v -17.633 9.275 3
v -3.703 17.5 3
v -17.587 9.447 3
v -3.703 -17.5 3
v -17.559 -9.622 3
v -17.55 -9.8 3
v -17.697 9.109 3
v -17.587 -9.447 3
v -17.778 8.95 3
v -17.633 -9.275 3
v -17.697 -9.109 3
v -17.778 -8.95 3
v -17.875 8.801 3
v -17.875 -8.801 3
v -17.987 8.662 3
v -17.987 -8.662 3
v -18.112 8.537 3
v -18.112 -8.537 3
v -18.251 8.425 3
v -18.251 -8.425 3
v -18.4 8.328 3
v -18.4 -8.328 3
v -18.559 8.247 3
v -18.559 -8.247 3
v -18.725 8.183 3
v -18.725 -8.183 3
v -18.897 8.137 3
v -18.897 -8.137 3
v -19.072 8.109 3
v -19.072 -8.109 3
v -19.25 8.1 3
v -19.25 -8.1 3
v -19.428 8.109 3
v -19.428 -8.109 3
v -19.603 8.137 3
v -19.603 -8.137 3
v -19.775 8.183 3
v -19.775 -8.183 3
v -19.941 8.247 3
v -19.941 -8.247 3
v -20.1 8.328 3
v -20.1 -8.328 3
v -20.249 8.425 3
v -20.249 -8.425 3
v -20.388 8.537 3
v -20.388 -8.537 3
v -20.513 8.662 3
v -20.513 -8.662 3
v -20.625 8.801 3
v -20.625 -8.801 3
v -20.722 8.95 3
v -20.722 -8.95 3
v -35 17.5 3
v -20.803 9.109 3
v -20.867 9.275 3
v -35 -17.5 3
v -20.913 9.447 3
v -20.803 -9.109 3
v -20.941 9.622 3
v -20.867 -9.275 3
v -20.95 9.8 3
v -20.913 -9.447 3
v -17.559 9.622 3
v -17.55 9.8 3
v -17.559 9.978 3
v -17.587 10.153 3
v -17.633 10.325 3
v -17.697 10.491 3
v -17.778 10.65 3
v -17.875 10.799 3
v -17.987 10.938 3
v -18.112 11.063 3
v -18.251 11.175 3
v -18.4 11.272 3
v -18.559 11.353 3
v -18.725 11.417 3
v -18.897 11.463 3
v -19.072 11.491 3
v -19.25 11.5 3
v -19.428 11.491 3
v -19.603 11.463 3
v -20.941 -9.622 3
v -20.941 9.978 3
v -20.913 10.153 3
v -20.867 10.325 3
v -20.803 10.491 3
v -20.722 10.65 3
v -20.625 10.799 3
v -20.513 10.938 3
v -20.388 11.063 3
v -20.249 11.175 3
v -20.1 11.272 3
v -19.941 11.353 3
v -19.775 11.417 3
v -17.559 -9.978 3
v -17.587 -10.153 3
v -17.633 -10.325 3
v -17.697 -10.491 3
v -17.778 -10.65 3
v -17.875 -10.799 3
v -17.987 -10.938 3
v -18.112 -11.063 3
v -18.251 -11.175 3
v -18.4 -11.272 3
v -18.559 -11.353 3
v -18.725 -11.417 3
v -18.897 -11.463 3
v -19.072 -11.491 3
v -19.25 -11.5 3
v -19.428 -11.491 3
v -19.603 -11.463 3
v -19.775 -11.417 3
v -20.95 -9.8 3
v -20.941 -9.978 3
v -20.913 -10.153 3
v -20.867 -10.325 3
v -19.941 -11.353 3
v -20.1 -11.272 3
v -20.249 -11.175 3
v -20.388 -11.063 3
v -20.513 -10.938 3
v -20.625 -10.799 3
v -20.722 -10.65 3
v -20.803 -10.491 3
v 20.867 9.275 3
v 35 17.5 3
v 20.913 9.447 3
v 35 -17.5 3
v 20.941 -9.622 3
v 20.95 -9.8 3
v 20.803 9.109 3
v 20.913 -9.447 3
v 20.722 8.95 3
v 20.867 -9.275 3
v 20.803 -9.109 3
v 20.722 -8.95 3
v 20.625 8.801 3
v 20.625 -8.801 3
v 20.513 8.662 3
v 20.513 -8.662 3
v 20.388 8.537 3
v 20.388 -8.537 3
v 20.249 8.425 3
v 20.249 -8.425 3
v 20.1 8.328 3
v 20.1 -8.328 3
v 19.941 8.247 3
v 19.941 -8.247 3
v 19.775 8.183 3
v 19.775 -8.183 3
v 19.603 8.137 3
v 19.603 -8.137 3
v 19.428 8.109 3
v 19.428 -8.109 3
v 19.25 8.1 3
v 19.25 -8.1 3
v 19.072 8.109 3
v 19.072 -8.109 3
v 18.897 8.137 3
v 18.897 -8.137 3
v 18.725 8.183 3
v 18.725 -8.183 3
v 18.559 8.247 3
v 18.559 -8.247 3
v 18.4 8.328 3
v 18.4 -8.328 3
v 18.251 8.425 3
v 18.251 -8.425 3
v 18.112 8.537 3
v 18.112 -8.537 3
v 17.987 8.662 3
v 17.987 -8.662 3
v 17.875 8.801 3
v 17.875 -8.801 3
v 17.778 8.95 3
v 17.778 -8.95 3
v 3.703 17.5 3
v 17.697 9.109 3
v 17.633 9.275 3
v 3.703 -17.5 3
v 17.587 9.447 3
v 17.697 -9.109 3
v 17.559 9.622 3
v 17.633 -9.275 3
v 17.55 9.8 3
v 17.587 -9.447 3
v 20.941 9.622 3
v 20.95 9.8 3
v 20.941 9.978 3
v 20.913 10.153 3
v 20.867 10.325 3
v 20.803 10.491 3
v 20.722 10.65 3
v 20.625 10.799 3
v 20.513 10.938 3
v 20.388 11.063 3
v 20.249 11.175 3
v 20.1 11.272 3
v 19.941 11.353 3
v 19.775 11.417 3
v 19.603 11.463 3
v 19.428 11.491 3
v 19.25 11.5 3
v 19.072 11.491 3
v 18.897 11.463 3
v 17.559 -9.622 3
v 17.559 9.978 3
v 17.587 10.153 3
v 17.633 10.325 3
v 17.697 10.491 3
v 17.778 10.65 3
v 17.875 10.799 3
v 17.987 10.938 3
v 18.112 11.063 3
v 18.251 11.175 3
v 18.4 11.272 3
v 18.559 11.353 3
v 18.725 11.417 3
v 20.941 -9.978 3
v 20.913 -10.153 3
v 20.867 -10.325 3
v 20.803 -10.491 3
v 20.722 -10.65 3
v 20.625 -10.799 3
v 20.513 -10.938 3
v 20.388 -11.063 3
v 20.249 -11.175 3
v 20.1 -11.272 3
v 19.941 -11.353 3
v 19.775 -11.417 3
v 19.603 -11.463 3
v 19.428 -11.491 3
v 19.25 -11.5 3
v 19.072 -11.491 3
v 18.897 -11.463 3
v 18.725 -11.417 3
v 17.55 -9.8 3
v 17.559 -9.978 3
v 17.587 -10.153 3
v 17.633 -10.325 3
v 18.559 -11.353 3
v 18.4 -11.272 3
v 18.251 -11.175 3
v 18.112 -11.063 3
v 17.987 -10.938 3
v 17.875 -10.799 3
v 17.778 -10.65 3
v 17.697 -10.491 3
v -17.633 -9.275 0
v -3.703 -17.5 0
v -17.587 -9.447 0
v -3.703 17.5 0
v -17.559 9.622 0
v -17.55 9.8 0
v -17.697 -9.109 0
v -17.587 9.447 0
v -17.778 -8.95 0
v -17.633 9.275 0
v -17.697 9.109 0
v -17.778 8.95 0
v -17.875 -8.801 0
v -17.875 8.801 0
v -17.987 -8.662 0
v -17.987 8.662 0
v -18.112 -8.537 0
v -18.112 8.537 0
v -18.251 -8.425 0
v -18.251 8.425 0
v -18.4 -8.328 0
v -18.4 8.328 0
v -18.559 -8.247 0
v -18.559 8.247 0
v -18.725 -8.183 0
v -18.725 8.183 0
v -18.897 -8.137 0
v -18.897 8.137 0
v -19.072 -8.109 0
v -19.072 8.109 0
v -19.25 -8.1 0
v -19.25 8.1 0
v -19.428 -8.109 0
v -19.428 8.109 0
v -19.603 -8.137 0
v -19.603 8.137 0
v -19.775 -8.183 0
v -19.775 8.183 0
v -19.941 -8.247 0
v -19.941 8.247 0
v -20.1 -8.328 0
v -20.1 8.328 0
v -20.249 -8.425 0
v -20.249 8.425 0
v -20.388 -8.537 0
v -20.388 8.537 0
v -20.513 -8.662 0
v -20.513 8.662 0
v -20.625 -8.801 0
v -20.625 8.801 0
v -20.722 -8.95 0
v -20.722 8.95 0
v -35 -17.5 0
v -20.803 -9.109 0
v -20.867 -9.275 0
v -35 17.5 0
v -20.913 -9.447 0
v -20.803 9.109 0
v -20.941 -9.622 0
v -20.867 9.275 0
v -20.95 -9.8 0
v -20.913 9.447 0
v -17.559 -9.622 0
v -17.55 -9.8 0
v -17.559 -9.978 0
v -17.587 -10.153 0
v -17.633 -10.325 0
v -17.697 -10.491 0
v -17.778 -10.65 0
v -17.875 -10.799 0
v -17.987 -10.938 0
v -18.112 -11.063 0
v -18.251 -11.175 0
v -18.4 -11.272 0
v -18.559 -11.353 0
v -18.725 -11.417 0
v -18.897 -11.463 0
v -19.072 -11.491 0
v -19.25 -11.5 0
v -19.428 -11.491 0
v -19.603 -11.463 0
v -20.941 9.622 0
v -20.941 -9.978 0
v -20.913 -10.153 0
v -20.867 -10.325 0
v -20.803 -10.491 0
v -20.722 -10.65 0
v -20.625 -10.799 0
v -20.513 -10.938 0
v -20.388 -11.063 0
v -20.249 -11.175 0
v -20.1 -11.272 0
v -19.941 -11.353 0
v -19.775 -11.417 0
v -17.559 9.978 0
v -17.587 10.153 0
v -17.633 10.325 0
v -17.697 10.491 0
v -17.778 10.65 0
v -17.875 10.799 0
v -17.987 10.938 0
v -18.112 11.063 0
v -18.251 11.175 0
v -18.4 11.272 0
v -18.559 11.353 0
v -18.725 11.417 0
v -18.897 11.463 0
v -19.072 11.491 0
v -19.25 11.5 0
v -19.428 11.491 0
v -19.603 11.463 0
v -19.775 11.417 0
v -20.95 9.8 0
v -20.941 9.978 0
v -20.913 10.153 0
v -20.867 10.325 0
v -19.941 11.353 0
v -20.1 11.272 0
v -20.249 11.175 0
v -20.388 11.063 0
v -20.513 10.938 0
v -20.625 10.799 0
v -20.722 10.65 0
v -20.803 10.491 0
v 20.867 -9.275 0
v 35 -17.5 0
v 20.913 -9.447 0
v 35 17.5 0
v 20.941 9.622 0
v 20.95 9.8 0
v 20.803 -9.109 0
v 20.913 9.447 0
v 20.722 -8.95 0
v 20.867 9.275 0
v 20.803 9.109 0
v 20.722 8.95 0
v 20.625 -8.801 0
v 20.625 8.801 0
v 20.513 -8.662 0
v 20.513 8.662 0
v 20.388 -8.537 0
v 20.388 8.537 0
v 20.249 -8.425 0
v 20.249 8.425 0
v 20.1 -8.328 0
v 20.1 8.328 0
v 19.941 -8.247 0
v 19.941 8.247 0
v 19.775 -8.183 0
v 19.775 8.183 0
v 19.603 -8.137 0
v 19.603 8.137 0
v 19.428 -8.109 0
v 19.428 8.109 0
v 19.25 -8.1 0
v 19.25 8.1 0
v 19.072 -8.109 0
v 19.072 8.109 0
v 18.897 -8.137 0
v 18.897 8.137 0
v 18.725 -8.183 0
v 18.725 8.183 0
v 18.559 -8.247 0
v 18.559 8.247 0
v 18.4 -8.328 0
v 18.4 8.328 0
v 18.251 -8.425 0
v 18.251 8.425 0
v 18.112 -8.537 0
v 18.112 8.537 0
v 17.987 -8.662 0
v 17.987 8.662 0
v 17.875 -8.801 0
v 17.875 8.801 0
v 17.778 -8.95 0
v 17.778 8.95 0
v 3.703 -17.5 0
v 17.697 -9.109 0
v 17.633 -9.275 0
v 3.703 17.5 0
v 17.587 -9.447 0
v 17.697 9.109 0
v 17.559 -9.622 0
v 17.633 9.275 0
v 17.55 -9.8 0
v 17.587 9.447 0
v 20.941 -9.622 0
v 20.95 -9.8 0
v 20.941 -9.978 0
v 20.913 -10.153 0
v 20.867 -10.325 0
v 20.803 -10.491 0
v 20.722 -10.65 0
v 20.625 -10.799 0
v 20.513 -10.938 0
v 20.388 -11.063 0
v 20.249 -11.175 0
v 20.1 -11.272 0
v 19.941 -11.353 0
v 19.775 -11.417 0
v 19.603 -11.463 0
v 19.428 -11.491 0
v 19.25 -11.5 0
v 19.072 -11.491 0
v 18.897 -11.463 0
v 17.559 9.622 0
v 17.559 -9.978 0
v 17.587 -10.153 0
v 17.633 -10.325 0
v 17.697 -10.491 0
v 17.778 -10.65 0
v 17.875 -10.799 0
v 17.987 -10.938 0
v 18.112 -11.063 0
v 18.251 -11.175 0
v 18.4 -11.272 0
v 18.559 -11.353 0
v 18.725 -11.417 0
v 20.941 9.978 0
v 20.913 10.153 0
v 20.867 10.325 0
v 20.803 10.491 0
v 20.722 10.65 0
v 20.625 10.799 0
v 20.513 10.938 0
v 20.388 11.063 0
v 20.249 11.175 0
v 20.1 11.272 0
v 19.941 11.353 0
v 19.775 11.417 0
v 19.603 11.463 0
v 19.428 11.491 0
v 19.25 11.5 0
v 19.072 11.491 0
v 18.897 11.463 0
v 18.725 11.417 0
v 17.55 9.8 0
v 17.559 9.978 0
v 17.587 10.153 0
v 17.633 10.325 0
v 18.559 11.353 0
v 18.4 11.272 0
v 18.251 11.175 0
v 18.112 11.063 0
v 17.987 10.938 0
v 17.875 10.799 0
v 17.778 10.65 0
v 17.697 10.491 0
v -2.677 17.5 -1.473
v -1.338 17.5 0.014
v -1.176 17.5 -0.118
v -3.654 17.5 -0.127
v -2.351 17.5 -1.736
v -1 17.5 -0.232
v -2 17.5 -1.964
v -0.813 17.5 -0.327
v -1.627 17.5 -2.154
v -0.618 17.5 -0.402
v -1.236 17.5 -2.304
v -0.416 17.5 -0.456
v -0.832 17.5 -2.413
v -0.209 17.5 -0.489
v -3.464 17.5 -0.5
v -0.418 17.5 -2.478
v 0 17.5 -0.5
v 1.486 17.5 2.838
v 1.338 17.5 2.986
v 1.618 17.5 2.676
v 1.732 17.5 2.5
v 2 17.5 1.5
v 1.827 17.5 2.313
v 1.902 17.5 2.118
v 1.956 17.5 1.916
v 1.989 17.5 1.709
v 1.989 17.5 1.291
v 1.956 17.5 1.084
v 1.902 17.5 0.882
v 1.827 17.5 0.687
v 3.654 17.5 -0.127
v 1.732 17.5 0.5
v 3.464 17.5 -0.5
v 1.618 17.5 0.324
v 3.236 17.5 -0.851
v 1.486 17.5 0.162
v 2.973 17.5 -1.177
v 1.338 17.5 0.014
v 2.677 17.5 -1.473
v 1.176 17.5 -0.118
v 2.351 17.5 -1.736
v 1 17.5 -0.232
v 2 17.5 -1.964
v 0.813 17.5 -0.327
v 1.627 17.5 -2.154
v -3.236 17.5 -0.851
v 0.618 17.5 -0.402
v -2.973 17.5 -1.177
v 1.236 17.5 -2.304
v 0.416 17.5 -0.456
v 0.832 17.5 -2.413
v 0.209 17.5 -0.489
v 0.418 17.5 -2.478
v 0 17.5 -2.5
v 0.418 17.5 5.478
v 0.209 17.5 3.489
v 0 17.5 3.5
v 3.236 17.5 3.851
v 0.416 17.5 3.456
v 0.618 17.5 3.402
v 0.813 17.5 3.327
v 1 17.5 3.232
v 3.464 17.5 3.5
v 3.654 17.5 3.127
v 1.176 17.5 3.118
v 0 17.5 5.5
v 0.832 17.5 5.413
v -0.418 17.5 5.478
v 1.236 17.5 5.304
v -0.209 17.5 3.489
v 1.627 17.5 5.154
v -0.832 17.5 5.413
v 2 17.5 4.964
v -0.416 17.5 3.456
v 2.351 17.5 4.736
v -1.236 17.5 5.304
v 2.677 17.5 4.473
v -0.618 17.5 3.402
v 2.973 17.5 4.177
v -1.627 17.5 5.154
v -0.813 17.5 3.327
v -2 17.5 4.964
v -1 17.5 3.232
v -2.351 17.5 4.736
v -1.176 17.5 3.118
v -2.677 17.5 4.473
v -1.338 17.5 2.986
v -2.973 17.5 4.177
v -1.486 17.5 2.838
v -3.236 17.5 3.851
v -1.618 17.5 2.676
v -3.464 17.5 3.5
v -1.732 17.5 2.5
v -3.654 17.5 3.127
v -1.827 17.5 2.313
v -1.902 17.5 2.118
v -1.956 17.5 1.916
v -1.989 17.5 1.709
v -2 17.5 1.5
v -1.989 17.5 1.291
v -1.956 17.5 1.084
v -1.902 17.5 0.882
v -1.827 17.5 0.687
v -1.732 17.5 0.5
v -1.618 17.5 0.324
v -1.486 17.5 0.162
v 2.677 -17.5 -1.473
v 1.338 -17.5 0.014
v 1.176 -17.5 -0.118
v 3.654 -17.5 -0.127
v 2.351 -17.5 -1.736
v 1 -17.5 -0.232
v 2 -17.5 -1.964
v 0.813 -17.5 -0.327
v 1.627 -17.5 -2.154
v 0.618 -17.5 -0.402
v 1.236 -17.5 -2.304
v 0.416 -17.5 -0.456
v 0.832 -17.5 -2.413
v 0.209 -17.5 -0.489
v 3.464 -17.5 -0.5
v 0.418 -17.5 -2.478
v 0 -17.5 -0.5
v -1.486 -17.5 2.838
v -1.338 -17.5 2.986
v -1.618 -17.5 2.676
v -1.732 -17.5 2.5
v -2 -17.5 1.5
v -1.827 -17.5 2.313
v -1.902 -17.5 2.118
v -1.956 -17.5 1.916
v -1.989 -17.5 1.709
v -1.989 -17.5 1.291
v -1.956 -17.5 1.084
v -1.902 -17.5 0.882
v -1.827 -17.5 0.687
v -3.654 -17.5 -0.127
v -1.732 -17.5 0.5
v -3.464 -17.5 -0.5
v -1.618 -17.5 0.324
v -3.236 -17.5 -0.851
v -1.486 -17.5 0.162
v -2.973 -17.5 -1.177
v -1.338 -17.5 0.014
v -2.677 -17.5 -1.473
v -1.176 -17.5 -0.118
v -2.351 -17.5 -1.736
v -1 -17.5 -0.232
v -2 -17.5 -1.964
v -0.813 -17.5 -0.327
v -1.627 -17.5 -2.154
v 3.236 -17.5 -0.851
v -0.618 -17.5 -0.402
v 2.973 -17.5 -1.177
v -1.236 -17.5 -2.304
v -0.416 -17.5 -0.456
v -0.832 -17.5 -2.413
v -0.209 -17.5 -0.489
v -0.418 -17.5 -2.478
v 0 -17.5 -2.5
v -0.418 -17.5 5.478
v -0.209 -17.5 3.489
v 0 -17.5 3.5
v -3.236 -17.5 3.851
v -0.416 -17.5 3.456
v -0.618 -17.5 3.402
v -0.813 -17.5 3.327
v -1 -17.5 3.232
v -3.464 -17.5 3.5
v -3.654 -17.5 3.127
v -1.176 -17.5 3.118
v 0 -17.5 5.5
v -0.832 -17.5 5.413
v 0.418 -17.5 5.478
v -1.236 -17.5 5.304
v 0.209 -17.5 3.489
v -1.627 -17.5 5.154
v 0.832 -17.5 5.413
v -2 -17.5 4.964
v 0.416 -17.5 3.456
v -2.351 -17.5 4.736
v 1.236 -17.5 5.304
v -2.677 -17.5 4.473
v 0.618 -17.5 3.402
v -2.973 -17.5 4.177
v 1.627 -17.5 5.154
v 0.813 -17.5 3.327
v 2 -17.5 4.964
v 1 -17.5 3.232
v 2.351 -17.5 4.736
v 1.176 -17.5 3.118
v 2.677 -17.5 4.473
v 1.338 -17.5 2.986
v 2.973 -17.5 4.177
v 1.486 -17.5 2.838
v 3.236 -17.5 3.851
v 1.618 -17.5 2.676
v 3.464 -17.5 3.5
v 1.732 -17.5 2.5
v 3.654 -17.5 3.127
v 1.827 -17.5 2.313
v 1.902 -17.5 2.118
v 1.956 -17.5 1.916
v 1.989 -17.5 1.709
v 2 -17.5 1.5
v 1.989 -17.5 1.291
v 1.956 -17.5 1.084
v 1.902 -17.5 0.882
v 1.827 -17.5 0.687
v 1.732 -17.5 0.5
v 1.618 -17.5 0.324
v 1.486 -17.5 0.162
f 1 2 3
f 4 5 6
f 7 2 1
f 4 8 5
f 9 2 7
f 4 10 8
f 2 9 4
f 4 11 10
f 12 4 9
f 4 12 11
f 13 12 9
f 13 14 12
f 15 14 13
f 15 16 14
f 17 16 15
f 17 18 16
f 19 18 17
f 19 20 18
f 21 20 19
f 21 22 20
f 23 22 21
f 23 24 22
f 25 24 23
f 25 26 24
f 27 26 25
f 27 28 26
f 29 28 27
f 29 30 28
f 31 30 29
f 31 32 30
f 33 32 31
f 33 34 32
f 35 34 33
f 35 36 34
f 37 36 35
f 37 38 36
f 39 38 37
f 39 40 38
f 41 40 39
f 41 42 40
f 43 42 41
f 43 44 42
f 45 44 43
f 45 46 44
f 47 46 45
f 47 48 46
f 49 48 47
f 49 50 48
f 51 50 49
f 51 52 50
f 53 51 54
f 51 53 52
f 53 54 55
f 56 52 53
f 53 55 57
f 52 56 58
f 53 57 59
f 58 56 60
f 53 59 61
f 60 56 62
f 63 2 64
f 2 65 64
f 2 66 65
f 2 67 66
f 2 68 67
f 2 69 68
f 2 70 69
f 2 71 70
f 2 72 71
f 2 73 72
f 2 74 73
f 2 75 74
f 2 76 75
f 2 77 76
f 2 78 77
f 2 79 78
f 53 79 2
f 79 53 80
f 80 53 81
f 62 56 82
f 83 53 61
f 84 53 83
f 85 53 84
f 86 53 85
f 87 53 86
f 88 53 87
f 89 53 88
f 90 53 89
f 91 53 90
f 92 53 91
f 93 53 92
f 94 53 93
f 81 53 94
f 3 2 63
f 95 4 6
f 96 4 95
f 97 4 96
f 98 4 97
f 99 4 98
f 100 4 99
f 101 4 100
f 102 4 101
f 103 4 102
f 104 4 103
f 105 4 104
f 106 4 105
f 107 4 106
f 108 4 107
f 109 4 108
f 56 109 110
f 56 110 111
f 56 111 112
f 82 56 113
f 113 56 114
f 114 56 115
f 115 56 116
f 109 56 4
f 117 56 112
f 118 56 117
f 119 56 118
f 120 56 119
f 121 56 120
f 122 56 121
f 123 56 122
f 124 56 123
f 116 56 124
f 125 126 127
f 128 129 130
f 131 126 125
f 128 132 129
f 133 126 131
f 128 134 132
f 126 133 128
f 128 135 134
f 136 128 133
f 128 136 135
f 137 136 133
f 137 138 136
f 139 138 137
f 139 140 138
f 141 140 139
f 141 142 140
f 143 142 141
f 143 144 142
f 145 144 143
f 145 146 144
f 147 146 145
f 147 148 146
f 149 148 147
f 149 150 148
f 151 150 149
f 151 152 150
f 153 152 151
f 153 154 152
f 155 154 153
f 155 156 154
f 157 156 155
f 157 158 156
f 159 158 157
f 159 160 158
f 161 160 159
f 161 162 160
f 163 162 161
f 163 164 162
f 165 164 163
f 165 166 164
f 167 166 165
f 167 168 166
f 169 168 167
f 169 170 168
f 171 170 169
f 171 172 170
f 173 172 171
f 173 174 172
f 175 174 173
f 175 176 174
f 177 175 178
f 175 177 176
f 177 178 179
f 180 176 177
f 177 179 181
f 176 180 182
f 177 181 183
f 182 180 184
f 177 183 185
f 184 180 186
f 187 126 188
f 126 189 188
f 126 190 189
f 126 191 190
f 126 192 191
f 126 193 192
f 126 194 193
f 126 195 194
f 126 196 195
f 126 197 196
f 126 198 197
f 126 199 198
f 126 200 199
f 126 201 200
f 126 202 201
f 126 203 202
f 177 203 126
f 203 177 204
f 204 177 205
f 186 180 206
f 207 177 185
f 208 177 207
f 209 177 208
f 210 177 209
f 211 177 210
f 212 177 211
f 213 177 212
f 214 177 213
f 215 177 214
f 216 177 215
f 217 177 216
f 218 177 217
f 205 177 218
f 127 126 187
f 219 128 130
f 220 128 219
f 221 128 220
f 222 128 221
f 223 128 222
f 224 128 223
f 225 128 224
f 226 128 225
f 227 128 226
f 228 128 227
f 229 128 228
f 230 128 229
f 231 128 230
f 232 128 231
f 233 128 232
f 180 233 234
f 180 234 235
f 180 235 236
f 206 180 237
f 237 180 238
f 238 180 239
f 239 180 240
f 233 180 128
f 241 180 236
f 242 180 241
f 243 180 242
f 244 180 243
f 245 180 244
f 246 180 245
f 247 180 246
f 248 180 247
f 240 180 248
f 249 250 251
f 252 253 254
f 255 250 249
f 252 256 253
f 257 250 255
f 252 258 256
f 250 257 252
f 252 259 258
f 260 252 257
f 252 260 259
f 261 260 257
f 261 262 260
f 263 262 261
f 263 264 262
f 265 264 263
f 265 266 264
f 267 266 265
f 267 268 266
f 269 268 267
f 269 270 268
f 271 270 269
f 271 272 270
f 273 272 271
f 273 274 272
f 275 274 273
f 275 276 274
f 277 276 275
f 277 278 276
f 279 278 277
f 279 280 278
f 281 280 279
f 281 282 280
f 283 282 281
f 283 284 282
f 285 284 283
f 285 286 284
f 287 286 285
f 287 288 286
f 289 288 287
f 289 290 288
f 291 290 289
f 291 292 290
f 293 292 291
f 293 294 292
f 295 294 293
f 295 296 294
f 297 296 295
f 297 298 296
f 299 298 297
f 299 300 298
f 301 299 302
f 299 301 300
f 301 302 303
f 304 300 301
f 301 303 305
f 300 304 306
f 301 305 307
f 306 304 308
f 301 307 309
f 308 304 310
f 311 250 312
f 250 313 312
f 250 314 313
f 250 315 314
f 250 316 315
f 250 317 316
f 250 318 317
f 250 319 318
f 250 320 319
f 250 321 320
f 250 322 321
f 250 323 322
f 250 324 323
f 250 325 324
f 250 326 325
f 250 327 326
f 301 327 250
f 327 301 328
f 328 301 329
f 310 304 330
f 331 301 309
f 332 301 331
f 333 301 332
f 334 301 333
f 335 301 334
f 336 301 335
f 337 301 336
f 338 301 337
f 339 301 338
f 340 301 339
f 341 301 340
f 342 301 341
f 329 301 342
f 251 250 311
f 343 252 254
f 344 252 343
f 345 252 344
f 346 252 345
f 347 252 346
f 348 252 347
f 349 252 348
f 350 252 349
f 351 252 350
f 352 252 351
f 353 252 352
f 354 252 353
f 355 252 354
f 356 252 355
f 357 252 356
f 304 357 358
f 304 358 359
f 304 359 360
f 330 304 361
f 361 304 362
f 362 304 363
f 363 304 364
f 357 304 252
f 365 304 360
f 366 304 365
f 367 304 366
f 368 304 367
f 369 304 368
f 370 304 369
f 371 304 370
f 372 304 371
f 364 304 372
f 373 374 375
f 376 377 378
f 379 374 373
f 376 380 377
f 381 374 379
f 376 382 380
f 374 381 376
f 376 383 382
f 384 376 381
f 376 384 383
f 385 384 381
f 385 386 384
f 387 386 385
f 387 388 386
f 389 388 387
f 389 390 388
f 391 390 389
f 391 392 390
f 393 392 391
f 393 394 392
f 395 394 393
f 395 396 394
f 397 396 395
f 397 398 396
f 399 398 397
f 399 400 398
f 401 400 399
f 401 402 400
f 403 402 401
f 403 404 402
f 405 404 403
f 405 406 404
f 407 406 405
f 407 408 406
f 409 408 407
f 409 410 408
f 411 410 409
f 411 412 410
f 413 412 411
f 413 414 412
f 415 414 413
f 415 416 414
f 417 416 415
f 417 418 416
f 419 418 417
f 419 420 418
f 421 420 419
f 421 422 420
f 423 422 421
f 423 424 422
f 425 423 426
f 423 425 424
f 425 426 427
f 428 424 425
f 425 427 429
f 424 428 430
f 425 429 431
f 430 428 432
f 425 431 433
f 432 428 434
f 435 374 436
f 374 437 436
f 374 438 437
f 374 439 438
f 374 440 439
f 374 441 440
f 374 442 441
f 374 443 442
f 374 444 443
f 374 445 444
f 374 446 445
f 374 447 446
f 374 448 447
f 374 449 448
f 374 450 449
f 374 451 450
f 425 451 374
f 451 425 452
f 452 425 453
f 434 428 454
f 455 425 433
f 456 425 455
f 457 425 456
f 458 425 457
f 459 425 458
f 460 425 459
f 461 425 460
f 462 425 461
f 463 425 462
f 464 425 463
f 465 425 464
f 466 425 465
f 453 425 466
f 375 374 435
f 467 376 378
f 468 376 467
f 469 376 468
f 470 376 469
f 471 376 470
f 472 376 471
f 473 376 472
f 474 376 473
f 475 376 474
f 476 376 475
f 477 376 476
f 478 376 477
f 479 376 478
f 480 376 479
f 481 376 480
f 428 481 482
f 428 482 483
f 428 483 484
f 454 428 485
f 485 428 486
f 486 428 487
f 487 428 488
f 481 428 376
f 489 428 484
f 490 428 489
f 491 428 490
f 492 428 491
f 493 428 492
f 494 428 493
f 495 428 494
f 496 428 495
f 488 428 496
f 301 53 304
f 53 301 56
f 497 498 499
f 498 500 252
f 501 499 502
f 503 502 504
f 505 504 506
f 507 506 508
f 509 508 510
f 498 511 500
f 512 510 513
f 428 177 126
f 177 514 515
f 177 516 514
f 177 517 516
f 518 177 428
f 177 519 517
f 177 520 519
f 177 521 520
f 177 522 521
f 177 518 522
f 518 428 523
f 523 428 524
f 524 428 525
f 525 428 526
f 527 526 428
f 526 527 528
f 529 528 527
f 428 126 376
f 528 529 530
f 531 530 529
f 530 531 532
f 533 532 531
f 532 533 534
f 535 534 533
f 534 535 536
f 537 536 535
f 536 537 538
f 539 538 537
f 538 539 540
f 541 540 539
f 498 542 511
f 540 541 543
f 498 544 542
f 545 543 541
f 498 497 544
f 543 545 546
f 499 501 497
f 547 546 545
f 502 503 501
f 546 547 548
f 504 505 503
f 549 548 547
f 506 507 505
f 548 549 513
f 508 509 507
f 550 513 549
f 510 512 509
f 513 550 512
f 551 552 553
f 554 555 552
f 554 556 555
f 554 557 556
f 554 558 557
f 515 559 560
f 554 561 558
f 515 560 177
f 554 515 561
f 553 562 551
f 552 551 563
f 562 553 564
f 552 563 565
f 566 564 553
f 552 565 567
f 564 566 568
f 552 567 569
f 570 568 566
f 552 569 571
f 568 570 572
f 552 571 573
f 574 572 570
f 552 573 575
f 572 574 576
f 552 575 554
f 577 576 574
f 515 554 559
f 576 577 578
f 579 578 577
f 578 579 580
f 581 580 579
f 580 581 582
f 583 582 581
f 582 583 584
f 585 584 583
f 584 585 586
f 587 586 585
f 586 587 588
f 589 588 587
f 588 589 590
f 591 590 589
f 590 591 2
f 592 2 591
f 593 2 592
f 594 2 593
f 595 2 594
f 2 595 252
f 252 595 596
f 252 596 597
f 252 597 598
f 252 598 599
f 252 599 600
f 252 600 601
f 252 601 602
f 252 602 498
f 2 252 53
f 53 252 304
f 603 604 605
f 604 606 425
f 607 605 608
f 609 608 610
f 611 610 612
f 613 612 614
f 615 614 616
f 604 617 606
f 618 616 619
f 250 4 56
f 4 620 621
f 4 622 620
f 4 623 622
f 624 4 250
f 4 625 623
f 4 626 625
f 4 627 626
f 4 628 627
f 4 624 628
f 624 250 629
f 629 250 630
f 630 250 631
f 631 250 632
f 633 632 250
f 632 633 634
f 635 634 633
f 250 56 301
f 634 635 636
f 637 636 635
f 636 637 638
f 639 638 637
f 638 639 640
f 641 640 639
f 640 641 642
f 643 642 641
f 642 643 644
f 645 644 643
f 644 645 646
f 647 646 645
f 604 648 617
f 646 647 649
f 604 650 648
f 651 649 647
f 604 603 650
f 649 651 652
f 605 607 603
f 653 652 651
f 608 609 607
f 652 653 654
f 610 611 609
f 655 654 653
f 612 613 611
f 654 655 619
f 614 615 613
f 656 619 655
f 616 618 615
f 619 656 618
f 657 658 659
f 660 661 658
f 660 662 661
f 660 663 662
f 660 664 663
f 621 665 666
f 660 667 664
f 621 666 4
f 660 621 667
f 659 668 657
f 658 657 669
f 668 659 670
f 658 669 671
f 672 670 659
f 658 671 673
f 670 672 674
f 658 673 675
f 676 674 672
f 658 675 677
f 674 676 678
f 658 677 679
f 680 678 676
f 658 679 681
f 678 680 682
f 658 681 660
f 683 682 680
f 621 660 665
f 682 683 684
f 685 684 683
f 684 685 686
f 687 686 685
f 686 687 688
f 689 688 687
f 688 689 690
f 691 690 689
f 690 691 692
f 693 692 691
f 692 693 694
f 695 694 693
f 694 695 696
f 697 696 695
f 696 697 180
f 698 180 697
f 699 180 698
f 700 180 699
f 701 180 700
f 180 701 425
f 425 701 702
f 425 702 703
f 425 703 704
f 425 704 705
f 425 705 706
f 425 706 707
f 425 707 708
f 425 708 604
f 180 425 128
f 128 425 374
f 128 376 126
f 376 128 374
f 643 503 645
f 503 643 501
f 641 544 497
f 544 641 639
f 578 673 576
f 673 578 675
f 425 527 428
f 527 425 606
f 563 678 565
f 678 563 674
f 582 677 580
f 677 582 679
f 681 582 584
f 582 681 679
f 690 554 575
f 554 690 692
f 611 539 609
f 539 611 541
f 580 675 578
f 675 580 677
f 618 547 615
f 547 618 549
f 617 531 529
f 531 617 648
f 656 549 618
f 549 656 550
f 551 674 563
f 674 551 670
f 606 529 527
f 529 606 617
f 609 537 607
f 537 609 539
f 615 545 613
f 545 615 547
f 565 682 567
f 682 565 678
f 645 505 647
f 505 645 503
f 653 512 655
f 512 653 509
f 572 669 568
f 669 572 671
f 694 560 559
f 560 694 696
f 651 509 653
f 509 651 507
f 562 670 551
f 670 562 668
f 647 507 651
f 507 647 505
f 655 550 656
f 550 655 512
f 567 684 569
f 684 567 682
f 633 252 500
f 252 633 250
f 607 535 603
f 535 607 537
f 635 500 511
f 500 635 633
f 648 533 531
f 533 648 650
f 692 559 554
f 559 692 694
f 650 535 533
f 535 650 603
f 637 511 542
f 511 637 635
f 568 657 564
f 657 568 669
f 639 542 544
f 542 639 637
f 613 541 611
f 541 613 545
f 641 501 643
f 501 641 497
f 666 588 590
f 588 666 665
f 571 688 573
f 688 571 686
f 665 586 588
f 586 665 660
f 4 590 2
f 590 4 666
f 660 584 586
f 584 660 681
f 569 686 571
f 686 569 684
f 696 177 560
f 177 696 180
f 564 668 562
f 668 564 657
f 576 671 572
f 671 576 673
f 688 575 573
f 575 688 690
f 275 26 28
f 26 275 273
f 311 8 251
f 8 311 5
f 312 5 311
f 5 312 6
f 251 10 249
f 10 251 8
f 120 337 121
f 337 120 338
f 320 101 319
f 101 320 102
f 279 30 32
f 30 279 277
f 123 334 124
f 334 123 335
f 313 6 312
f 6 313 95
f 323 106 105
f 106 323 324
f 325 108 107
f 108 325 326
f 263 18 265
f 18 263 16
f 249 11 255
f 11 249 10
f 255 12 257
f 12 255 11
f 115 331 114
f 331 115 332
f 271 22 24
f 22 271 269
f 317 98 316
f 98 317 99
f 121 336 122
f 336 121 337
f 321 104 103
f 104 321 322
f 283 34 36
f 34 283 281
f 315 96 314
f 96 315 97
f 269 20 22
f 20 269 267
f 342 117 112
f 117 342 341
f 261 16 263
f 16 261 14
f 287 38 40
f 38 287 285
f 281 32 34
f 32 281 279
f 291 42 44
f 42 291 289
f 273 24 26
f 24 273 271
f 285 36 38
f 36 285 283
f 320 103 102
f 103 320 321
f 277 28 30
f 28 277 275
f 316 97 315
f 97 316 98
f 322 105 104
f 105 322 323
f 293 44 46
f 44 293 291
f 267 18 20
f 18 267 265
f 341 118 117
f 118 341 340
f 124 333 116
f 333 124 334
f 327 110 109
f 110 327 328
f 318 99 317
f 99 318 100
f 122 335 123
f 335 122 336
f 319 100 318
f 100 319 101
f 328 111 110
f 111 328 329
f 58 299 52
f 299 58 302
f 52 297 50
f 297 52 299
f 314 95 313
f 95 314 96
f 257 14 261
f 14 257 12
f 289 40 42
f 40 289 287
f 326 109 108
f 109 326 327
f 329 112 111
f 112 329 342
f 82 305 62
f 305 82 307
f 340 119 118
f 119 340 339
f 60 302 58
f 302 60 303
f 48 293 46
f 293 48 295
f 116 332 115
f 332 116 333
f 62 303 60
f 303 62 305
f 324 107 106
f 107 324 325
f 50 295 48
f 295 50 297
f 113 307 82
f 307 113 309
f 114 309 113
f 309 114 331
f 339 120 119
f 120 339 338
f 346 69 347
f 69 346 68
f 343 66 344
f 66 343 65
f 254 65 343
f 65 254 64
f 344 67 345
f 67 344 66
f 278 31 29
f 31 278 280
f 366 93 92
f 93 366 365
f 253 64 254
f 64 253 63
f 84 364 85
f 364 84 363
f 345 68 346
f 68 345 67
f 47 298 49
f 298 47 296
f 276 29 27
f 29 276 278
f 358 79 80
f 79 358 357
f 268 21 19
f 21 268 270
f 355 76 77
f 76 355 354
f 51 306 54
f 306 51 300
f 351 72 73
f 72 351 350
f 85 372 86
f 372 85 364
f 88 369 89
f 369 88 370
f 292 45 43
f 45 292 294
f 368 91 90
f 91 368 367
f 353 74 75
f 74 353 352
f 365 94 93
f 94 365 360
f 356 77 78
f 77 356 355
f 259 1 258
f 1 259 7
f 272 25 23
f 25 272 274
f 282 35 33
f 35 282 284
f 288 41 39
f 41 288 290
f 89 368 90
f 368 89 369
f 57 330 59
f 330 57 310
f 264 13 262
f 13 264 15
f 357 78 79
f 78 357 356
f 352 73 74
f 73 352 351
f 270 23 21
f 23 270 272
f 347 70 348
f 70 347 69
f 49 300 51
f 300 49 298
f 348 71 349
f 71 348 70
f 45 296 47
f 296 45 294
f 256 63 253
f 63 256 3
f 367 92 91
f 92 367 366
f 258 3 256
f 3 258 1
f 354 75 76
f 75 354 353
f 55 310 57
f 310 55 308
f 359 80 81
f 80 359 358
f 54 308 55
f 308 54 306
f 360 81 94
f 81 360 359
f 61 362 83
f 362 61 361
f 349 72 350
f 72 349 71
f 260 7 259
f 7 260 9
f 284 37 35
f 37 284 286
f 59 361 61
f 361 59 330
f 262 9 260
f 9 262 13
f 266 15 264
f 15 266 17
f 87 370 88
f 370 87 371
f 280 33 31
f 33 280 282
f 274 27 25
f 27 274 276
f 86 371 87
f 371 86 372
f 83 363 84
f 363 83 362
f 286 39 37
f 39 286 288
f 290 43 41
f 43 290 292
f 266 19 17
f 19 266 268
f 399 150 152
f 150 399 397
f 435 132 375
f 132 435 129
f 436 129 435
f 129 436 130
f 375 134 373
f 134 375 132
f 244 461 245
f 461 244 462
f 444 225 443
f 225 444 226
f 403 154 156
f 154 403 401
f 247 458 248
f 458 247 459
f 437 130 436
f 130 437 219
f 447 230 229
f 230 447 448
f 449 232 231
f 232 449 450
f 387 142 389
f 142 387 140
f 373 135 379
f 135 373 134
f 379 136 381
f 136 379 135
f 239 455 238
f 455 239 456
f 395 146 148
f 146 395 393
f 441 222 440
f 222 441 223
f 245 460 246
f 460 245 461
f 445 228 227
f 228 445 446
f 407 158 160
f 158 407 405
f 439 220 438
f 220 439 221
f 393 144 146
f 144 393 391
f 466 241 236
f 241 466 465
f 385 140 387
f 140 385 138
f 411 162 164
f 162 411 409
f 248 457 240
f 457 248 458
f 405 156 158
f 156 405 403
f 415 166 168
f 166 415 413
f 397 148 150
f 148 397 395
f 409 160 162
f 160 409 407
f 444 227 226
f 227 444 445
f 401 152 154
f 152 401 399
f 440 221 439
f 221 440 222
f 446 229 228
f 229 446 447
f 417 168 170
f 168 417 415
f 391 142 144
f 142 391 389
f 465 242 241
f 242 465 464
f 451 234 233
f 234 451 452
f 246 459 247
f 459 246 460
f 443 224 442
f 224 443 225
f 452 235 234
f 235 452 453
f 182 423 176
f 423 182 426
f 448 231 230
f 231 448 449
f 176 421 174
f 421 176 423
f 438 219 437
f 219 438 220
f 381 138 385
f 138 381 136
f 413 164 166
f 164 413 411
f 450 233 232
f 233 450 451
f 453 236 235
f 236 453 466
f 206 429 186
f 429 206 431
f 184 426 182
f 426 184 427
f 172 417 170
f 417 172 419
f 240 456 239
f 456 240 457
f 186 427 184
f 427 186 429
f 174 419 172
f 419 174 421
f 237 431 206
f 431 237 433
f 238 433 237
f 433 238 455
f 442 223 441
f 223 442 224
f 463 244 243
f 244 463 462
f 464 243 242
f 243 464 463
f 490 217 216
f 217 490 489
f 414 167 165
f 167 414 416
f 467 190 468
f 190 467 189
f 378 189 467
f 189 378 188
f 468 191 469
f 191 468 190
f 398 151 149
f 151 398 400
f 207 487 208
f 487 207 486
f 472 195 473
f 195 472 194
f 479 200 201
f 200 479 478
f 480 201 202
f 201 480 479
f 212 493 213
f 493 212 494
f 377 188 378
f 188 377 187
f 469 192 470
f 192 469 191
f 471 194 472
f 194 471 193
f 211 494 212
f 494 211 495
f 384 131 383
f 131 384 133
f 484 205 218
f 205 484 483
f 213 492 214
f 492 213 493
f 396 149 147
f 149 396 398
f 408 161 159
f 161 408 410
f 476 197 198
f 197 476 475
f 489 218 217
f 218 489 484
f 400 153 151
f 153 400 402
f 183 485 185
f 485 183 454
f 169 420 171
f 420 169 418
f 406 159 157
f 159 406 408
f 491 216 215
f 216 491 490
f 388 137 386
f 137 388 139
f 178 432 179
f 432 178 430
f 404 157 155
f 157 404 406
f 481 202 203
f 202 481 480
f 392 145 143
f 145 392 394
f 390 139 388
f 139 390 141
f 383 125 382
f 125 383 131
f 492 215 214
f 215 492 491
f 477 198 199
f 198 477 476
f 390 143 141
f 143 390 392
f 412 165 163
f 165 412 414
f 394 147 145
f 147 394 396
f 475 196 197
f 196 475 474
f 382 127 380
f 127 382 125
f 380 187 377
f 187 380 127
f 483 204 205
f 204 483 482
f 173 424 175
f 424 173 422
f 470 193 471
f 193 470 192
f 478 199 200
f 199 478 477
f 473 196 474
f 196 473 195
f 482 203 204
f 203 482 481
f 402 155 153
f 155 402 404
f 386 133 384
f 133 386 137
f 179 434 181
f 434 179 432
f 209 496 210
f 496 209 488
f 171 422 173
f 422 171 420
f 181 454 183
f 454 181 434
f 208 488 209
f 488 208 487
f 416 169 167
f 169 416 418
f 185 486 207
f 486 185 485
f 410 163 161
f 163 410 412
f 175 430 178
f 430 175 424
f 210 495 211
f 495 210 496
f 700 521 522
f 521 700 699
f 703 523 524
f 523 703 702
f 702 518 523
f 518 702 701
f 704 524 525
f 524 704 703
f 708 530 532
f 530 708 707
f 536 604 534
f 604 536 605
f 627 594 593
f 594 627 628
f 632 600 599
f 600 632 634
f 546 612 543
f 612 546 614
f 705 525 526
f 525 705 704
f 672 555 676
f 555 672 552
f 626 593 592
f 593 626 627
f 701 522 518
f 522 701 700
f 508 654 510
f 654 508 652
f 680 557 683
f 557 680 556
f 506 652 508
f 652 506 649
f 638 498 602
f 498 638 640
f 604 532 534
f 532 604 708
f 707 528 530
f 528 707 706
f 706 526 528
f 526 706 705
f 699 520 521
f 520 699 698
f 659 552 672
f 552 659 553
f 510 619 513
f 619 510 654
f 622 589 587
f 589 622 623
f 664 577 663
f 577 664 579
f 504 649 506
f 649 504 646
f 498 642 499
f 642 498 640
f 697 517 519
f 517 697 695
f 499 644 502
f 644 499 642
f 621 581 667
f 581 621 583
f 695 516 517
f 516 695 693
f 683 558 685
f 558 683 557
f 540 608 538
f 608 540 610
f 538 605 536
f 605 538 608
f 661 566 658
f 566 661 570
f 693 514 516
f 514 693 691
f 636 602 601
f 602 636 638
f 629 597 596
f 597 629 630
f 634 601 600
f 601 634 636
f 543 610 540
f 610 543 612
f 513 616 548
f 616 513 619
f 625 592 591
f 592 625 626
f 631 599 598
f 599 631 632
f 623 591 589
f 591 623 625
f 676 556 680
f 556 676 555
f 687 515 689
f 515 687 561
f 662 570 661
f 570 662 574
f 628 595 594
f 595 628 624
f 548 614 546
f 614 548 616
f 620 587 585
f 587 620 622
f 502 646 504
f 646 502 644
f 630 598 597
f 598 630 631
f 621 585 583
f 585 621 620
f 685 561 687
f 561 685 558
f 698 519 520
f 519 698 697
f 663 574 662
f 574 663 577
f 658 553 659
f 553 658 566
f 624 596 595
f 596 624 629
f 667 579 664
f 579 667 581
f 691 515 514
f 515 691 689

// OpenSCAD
// Two-leaf hinge with a printable straight pin barrel.
$fn = 60;
eps = 0.02;
leaf_l = 35;
leaf_w = 35;
leaf_t = 3;
pin_d = 4;
barrel_d = pin_d + 4;
difference() {
    union() {
        translate([-leaf_l, -leaf_w / 2, 0]) cube([leaf_l, leaf_w, leaf_t]);
        translate([0, -leaf_w / 2, 0]) cube([leaf_l, leaf_w, leaf_t]);
        translate([0, -leaf_w / 2, leaf_t / 2]) rotate([-90, 0, 0]) cylinder(d = barrel_d, h = leaf_w);
    }
    translate([0, -leaf_w / 2 - eps, leaf_t / 2]) rotate([-90, 0, 0]) cylinder(d = pin_d, h = leaf_w + 2 * eps);
    for (x = [-leaf_l * 0.55, leaf_l * 0.55], y = [-leaf_w * 0.28, leaf_w * 0.28])
        translate([x, y, -eps]) cylinder(d = 3.4, h = leaf_t + 2 * eps);
}
